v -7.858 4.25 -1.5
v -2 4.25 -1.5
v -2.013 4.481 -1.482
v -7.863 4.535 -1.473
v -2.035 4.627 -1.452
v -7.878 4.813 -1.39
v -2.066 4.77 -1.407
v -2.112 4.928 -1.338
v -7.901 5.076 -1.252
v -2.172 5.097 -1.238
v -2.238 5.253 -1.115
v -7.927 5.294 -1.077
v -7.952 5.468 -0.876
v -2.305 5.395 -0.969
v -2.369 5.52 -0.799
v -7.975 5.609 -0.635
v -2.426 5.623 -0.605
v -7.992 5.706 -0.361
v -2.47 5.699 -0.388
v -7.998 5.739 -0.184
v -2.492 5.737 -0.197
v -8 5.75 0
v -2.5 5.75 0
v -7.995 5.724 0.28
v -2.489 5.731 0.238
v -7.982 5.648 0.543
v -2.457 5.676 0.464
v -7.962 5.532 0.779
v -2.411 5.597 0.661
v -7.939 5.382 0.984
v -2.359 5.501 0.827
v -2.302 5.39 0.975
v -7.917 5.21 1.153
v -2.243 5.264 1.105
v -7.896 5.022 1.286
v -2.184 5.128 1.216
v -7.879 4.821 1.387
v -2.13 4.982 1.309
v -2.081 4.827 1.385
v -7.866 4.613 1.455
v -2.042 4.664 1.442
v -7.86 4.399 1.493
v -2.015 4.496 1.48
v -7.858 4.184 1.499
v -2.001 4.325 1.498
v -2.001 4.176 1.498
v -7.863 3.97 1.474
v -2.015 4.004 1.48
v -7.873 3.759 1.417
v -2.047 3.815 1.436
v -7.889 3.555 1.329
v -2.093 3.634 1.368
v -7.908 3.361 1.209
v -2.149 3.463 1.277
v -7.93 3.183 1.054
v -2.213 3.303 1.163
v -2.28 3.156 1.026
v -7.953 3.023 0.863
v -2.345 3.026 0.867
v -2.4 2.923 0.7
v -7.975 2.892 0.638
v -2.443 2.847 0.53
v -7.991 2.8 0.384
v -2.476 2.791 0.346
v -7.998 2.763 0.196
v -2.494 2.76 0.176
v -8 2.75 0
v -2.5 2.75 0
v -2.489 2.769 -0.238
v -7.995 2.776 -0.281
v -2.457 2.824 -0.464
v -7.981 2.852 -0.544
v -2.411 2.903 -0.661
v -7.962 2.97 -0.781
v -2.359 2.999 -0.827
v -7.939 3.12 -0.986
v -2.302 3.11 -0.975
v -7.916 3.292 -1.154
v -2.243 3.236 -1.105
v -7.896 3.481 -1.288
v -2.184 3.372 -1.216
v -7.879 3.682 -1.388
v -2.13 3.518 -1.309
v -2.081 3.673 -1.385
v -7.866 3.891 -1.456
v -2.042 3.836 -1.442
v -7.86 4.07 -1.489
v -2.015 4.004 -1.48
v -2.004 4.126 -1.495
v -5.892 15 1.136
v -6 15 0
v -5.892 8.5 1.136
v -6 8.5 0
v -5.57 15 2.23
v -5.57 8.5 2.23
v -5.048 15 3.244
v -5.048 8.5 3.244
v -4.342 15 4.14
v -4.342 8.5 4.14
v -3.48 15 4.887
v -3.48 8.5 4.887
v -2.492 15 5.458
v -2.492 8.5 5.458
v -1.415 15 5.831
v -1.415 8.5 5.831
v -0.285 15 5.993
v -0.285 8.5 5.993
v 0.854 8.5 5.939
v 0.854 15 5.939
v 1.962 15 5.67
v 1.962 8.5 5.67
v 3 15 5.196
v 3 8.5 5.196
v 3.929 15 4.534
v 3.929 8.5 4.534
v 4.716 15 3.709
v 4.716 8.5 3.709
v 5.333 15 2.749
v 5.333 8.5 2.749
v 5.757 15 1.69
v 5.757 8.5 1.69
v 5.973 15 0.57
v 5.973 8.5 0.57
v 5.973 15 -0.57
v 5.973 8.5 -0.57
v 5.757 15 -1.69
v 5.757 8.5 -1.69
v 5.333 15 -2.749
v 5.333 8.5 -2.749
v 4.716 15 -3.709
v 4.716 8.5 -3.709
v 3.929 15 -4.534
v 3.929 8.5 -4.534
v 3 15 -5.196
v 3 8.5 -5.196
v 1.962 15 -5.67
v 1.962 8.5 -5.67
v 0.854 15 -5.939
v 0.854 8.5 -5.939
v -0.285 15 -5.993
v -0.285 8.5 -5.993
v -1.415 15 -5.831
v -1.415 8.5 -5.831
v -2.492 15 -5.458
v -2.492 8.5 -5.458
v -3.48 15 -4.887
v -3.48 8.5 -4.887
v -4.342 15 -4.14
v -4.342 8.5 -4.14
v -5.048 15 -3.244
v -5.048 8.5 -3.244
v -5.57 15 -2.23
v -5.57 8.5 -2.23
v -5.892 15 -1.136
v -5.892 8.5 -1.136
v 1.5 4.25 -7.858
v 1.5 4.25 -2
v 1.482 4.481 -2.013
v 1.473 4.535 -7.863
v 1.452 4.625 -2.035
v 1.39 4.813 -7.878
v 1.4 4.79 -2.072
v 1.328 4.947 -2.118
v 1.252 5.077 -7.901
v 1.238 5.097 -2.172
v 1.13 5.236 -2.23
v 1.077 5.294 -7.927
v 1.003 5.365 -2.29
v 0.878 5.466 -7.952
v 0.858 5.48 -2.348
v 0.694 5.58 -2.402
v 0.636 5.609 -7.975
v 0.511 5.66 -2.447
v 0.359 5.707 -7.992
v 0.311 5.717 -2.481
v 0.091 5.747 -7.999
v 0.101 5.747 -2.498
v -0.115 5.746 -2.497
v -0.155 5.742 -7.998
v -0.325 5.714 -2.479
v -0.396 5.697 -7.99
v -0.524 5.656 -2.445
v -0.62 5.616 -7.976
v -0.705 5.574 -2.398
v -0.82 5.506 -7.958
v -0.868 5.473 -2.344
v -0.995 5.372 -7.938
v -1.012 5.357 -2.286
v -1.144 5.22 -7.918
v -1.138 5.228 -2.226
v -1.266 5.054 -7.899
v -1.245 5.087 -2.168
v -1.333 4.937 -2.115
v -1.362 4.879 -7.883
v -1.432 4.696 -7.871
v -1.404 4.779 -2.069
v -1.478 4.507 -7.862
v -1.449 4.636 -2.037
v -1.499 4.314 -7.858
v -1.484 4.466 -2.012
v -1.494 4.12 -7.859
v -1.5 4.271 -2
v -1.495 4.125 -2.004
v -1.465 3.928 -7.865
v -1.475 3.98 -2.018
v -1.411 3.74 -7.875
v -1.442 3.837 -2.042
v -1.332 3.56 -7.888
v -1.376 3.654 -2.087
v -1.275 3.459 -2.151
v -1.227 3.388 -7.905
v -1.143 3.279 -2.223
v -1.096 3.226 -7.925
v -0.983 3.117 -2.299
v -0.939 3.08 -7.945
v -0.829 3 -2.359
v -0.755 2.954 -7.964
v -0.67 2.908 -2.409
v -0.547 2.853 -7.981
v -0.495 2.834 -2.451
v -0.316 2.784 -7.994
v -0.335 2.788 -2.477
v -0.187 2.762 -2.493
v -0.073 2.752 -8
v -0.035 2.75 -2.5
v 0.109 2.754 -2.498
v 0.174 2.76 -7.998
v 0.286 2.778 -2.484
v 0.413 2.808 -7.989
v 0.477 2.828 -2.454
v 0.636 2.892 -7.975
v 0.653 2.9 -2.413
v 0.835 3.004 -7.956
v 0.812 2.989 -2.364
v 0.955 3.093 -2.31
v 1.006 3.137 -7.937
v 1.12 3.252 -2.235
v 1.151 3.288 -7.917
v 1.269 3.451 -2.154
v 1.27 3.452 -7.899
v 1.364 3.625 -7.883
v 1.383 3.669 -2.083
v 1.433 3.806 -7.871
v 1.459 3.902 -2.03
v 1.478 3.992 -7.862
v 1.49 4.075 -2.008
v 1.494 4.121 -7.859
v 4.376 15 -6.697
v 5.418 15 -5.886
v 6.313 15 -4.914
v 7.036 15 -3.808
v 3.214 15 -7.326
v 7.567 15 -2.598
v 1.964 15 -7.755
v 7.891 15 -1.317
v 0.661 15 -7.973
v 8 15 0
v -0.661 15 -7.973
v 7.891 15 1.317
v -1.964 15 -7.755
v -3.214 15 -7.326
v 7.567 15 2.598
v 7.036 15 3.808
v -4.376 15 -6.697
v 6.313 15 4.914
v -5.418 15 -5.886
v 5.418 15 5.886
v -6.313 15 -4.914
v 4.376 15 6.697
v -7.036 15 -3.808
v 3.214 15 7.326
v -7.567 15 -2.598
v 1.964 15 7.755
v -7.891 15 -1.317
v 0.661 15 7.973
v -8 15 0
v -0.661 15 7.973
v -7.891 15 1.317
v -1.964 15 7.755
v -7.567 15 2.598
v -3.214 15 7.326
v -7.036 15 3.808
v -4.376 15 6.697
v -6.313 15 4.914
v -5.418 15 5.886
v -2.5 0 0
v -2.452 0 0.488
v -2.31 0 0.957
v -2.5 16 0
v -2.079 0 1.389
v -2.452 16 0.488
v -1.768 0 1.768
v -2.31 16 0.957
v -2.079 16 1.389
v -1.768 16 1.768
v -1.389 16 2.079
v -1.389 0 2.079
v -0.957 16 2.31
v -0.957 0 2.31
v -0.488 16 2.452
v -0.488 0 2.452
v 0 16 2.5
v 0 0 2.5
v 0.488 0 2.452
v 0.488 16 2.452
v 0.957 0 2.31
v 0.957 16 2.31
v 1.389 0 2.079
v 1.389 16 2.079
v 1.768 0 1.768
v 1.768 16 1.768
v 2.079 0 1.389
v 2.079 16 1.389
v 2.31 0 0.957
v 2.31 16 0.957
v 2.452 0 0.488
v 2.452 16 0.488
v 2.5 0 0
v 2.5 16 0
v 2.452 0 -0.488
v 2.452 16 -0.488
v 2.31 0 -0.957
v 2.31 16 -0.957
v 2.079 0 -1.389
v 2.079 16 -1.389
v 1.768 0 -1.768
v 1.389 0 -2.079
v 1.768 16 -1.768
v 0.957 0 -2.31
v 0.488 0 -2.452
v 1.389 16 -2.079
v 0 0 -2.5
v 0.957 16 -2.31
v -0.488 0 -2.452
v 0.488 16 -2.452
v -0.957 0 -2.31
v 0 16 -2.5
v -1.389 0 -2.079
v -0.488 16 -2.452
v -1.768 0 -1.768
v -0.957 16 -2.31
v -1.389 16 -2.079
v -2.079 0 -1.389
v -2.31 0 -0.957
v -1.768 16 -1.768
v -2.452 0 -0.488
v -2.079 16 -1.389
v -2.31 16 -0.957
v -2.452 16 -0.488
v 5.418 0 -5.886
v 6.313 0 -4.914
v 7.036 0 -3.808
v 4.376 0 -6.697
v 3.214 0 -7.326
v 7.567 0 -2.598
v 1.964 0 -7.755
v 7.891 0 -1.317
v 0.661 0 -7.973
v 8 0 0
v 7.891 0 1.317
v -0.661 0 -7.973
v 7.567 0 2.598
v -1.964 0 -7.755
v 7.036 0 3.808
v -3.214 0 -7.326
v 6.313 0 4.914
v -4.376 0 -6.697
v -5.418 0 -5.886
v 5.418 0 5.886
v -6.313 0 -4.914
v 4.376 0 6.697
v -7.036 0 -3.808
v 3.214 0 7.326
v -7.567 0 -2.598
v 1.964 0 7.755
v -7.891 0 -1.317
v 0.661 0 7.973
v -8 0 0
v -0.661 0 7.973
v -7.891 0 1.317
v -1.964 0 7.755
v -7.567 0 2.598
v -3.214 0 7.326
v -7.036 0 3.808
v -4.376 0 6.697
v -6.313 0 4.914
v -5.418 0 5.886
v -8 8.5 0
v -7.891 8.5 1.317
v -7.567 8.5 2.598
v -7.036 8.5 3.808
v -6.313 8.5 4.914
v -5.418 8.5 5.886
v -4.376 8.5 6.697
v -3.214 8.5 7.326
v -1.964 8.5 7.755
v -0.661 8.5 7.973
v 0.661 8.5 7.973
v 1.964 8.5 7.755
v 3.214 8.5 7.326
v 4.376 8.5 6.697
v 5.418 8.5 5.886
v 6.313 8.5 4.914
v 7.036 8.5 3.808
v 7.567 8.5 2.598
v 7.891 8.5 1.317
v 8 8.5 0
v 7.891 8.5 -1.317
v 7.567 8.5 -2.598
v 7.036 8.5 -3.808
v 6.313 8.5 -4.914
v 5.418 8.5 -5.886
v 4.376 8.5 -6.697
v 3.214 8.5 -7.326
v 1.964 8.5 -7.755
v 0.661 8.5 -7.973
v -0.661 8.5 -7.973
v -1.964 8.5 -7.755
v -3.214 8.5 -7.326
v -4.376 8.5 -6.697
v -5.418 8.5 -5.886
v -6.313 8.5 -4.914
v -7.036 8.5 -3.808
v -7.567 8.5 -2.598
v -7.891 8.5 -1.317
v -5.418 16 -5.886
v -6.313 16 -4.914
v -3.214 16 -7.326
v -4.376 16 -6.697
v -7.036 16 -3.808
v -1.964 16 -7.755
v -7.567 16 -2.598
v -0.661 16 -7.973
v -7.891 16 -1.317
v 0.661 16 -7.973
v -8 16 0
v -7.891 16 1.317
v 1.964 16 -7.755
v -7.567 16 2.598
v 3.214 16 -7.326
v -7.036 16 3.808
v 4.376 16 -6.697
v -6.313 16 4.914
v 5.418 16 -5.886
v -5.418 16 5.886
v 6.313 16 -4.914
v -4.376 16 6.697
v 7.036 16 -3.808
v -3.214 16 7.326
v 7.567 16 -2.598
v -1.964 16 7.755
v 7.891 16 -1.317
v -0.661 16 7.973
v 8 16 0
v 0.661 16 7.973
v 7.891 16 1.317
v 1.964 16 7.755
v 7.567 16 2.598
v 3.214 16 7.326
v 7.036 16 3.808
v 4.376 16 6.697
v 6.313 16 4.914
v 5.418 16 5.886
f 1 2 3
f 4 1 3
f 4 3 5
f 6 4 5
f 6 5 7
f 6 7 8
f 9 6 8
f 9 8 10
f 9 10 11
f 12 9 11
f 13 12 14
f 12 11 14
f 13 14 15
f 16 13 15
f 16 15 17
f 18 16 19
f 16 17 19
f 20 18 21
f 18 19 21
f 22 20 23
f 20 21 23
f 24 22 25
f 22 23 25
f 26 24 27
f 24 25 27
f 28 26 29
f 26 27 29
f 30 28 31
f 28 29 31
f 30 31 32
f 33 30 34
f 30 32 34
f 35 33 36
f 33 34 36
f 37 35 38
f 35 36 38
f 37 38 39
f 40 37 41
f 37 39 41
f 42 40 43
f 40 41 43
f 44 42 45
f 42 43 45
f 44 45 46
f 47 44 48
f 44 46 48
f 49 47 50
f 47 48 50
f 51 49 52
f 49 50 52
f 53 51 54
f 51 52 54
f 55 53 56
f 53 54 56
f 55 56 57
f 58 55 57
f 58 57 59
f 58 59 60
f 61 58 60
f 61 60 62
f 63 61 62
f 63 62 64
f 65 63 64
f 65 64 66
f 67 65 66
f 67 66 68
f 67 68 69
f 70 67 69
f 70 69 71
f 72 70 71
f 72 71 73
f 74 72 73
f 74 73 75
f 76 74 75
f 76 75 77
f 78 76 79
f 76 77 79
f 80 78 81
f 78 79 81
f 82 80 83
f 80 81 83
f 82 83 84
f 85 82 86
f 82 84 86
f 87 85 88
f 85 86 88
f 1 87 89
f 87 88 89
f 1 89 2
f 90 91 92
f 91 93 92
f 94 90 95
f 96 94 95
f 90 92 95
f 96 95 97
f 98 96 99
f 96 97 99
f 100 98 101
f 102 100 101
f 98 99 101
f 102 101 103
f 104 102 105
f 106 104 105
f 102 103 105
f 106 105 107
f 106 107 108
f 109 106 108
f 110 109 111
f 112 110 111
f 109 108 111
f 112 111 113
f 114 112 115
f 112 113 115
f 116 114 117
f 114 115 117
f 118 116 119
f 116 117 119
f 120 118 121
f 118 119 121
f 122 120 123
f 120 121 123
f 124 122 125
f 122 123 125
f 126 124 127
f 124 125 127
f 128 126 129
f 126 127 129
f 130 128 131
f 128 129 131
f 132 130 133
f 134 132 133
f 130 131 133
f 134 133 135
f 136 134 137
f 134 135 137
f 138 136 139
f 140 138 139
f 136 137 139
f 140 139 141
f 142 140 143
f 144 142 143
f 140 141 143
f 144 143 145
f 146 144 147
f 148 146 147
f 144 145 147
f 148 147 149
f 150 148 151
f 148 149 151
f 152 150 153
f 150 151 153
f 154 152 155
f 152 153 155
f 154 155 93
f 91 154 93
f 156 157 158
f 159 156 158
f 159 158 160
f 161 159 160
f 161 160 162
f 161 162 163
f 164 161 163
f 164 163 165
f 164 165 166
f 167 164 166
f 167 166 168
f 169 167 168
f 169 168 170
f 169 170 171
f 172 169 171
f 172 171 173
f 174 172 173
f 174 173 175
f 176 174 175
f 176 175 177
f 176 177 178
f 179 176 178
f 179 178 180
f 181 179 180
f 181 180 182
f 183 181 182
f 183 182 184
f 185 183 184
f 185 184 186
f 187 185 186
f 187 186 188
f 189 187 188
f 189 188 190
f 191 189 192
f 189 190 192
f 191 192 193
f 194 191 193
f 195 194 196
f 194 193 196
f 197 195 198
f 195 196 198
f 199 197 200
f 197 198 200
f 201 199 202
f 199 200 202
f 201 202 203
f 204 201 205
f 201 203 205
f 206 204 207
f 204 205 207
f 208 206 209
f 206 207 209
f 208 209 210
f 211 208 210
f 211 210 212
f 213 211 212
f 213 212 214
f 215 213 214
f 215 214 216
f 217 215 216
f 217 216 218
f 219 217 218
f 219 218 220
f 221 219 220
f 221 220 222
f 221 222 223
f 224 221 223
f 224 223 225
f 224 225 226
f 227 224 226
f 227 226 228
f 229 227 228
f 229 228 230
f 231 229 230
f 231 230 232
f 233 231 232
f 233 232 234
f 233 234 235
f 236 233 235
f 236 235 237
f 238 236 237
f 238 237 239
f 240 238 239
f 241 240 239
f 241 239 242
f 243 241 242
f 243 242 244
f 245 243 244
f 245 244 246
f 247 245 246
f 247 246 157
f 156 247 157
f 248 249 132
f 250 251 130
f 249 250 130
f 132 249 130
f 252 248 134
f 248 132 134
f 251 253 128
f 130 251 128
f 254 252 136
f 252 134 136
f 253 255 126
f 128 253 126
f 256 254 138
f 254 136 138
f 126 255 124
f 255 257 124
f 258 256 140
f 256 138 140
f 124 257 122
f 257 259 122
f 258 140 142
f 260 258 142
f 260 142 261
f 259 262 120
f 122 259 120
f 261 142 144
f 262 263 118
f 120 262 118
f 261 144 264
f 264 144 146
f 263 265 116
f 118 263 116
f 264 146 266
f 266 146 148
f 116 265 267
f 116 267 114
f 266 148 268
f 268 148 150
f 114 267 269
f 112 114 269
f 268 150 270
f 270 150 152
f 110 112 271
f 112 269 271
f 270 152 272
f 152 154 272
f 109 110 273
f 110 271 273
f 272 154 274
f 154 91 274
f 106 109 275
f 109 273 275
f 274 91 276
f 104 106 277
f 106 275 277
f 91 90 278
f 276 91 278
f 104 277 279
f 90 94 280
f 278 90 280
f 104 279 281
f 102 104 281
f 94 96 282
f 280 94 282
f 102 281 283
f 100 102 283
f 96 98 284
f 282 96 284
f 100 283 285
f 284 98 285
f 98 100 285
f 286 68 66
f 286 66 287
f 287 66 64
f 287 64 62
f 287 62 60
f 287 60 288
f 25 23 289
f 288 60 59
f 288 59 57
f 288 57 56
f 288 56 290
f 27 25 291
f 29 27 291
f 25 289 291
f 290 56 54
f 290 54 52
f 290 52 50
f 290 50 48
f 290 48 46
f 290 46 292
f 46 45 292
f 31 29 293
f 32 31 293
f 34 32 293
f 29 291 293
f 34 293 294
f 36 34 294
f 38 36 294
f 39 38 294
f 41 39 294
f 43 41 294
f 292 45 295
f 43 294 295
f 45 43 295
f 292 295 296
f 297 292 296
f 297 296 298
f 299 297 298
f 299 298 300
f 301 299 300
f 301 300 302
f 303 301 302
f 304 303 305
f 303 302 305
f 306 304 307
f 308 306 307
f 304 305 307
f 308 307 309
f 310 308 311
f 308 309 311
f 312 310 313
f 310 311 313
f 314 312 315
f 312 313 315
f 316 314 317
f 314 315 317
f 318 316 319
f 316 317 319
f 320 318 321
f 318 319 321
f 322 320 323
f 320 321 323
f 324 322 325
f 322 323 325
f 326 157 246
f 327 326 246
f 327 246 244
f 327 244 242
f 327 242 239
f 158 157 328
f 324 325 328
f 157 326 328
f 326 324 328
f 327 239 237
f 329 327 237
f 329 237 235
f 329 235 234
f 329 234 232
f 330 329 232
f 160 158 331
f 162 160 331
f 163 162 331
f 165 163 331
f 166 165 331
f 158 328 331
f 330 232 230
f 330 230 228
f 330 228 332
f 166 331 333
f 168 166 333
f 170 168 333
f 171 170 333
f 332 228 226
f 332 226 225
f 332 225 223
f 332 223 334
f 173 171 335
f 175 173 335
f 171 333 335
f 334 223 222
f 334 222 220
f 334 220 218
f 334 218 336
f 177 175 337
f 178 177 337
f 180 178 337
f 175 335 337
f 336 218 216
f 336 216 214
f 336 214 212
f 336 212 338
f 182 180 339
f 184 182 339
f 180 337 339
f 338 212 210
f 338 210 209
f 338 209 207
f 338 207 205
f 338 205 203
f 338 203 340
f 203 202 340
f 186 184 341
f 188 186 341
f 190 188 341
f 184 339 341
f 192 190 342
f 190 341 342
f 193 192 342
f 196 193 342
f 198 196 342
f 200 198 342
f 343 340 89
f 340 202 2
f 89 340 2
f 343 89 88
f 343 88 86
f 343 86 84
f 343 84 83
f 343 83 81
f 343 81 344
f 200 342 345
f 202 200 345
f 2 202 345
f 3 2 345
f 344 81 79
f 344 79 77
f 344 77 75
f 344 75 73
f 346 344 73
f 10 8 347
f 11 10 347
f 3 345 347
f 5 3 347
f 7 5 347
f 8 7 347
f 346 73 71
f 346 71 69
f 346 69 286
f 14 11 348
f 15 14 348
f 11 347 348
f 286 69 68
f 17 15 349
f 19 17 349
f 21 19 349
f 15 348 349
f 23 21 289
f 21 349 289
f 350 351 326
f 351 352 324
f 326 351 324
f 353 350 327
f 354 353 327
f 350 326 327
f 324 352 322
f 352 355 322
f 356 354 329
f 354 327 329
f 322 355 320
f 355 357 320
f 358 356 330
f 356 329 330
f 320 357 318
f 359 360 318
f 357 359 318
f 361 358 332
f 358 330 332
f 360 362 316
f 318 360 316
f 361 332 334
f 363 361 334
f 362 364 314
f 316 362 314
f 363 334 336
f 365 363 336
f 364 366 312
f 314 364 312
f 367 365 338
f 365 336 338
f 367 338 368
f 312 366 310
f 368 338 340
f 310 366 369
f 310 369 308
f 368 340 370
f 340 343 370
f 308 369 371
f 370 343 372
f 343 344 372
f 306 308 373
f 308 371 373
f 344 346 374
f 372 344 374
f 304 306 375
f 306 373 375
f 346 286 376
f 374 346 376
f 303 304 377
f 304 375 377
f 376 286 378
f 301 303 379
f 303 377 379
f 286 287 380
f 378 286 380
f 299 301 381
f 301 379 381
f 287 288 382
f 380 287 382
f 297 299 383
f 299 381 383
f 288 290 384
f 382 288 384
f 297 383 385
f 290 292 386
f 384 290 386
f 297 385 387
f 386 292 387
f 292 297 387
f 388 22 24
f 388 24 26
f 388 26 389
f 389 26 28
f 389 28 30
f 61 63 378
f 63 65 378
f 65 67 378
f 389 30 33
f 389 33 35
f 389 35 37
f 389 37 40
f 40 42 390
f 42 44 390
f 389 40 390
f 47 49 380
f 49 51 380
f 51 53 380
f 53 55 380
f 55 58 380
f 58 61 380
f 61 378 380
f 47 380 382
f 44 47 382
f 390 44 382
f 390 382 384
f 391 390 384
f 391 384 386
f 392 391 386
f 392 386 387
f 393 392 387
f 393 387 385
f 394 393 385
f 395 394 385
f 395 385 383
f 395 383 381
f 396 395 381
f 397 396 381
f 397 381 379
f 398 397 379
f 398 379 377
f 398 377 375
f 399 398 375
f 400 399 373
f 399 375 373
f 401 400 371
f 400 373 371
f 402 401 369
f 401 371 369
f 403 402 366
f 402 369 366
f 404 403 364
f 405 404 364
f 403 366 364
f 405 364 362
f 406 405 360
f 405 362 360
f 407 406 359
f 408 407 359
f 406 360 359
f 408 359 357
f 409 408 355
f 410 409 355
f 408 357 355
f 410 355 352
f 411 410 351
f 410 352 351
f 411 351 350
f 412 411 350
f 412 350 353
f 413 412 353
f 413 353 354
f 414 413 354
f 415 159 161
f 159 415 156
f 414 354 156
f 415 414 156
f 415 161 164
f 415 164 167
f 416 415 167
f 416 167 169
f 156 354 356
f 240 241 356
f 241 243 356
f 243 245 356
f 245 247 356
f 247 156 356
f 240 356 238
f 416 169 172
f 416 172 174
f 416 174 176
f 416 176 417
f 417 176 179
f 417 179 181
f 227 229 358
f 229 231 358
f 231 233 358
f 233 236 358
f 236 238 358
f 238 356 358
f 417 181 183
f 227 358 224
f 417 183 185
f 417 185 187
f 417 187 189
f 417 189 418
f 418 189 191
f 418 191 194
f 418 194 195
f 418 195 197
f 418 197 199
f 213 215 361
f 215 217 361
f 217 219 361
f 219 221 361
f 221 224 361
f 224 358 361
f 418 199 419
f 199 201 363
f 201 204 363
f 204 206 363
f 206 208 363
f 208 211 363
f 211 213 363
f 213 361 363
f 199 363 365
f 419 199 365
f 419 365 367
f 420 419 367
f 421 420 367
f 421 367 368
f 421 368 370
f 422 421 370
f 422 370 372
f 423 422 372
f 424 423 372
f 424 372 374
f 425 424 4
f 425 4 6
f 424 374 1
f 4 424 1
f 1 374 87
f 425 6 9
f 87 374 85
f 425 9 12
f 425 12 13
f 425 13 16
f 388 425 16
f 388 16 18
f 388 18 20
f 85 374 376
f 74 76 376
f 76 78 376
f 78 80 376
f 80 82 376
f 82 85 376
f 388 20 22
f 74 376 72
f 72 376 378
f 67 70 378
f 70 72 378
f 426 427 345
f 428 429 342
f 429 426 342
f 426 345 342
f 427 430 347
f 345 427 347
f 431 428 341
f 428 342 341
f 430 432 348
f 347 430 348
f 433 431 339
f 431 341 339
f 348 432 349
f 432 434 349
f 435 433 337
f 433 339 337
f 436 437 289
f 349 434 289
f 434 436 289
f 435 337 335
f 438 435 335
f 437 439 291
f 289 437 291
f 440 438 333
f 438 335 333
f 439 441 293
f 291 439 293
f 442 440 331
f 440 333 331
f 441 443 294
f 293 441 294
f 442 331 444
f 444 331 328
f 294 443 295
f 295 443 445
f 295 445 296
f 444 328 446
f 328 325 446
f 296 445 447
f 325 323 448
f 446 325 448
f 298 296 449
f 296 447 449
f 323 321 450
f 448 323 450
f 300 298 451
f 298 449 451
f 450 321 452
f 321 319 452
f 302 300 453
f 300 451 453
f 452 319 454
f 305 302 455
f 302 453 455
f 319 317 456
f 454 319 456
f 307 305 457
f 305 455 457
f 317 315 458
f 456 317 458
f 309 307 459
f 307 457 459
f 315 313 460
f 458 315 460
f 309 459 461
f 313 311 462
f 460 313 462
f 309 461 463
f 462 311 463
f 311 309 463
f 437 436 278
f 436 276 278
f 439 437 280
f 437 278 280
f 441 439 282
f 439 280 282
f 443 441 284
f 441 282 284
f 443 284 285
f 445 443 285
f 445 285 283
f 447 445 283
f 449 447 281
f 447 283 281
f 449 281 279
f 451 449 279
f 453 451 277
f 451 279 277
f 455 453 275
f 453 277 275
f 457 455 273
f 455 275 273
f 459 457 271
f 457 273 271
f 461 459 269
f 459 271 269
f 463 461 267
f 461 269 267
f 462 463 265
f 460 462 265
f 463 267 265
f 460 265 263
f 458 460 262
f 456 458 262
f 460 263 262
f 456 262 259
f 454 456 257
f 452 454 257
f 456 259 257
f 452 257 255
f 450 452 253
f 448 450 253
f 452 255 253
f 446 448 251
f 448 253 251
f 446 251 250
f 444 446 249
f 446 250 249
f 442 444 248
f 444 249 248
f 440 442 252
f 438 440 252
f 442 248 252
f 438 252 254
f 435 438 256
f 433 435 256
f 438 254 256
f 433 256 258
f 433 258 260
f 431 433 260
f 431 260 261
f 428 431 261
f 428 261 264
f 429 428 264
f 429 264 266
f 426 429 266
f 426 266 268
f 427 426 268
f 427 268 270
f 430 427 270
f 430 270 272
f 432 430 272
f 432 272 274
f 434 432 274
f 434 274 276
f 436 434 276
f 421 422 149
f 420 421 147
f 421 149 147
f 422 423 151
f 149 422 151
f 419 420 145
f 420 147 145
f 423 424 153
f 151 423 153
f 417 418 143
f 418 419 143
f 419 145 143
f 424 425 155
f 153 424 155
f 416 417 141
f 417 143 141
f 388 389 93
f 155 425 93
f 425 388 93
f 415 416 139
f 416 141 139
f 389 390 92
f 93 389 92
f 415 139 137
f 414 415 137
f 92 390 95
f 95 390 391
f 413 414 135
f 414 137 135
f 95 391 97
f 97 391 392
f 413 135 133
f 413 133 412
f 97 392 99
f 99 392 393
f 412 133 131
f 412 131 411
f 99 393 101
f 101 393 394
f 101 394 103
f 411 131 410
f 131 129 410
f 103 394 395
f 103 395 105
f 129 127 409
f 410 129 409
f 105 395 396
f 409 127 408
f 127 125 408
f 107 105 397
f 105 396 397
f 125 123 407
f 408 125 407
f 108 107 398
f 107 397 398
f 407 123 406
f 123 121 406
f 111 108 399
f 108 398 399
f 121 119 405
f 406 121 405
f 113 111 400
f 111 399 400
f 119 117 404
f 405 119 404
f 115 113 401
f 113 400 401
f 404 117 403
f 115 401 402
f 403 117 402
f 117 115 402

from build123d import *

# Parameters (mm, degrees)
ESQUISSE2_R             = 1.5
ENL_V_MAT_EXTRU_1_DEPTH = 9
ESQUISSE3_R             = 1.5
ENL_V_MAT_EXTRU_2_DEPTH = 9.0000001


with BuildPart() as part:
    # Esquisse1 → Révolution1 (revolve)
    with BuildSketch(Plane.XY):
        Polygon((-2.5, 0), (-2.5, 16), (-8, 16), (-8, 15), (-6, 15), (-6, 8.5), (-8, 8.5), (-8, 0), align=None)
    revolve(axis=Axis((0, 0, 0), (0, 1, 0)))

    # Esquisse2 → Enlèv. mat.-Extru.1 (cut, through all)
    with BuildSketch(Plane(origin=(0, 0, 0), x_dir=(0, 0, -1), z_dir=(1, 0, 0))):
        with Locations((0, 4.25)):
            Circle(ESQUISSE2_R)
    extrude(amount=-ENL_V_MAT_EXTRU_1_DEPTH, mode=Mode.SUBTRACT)

    # Esquisse3 → Enlèv. mat.-Extru.2 (cut, through all)
    with BuildSketch(Plane.XY):
        with Locations((0, 4.25)):
            Circle(ESQUISSE3_R)
    extrude(amount=-ENL_V_MAT_EXTRU_2_DEPTH, mode=Mode.SUBTRACT)


solid = part.part
